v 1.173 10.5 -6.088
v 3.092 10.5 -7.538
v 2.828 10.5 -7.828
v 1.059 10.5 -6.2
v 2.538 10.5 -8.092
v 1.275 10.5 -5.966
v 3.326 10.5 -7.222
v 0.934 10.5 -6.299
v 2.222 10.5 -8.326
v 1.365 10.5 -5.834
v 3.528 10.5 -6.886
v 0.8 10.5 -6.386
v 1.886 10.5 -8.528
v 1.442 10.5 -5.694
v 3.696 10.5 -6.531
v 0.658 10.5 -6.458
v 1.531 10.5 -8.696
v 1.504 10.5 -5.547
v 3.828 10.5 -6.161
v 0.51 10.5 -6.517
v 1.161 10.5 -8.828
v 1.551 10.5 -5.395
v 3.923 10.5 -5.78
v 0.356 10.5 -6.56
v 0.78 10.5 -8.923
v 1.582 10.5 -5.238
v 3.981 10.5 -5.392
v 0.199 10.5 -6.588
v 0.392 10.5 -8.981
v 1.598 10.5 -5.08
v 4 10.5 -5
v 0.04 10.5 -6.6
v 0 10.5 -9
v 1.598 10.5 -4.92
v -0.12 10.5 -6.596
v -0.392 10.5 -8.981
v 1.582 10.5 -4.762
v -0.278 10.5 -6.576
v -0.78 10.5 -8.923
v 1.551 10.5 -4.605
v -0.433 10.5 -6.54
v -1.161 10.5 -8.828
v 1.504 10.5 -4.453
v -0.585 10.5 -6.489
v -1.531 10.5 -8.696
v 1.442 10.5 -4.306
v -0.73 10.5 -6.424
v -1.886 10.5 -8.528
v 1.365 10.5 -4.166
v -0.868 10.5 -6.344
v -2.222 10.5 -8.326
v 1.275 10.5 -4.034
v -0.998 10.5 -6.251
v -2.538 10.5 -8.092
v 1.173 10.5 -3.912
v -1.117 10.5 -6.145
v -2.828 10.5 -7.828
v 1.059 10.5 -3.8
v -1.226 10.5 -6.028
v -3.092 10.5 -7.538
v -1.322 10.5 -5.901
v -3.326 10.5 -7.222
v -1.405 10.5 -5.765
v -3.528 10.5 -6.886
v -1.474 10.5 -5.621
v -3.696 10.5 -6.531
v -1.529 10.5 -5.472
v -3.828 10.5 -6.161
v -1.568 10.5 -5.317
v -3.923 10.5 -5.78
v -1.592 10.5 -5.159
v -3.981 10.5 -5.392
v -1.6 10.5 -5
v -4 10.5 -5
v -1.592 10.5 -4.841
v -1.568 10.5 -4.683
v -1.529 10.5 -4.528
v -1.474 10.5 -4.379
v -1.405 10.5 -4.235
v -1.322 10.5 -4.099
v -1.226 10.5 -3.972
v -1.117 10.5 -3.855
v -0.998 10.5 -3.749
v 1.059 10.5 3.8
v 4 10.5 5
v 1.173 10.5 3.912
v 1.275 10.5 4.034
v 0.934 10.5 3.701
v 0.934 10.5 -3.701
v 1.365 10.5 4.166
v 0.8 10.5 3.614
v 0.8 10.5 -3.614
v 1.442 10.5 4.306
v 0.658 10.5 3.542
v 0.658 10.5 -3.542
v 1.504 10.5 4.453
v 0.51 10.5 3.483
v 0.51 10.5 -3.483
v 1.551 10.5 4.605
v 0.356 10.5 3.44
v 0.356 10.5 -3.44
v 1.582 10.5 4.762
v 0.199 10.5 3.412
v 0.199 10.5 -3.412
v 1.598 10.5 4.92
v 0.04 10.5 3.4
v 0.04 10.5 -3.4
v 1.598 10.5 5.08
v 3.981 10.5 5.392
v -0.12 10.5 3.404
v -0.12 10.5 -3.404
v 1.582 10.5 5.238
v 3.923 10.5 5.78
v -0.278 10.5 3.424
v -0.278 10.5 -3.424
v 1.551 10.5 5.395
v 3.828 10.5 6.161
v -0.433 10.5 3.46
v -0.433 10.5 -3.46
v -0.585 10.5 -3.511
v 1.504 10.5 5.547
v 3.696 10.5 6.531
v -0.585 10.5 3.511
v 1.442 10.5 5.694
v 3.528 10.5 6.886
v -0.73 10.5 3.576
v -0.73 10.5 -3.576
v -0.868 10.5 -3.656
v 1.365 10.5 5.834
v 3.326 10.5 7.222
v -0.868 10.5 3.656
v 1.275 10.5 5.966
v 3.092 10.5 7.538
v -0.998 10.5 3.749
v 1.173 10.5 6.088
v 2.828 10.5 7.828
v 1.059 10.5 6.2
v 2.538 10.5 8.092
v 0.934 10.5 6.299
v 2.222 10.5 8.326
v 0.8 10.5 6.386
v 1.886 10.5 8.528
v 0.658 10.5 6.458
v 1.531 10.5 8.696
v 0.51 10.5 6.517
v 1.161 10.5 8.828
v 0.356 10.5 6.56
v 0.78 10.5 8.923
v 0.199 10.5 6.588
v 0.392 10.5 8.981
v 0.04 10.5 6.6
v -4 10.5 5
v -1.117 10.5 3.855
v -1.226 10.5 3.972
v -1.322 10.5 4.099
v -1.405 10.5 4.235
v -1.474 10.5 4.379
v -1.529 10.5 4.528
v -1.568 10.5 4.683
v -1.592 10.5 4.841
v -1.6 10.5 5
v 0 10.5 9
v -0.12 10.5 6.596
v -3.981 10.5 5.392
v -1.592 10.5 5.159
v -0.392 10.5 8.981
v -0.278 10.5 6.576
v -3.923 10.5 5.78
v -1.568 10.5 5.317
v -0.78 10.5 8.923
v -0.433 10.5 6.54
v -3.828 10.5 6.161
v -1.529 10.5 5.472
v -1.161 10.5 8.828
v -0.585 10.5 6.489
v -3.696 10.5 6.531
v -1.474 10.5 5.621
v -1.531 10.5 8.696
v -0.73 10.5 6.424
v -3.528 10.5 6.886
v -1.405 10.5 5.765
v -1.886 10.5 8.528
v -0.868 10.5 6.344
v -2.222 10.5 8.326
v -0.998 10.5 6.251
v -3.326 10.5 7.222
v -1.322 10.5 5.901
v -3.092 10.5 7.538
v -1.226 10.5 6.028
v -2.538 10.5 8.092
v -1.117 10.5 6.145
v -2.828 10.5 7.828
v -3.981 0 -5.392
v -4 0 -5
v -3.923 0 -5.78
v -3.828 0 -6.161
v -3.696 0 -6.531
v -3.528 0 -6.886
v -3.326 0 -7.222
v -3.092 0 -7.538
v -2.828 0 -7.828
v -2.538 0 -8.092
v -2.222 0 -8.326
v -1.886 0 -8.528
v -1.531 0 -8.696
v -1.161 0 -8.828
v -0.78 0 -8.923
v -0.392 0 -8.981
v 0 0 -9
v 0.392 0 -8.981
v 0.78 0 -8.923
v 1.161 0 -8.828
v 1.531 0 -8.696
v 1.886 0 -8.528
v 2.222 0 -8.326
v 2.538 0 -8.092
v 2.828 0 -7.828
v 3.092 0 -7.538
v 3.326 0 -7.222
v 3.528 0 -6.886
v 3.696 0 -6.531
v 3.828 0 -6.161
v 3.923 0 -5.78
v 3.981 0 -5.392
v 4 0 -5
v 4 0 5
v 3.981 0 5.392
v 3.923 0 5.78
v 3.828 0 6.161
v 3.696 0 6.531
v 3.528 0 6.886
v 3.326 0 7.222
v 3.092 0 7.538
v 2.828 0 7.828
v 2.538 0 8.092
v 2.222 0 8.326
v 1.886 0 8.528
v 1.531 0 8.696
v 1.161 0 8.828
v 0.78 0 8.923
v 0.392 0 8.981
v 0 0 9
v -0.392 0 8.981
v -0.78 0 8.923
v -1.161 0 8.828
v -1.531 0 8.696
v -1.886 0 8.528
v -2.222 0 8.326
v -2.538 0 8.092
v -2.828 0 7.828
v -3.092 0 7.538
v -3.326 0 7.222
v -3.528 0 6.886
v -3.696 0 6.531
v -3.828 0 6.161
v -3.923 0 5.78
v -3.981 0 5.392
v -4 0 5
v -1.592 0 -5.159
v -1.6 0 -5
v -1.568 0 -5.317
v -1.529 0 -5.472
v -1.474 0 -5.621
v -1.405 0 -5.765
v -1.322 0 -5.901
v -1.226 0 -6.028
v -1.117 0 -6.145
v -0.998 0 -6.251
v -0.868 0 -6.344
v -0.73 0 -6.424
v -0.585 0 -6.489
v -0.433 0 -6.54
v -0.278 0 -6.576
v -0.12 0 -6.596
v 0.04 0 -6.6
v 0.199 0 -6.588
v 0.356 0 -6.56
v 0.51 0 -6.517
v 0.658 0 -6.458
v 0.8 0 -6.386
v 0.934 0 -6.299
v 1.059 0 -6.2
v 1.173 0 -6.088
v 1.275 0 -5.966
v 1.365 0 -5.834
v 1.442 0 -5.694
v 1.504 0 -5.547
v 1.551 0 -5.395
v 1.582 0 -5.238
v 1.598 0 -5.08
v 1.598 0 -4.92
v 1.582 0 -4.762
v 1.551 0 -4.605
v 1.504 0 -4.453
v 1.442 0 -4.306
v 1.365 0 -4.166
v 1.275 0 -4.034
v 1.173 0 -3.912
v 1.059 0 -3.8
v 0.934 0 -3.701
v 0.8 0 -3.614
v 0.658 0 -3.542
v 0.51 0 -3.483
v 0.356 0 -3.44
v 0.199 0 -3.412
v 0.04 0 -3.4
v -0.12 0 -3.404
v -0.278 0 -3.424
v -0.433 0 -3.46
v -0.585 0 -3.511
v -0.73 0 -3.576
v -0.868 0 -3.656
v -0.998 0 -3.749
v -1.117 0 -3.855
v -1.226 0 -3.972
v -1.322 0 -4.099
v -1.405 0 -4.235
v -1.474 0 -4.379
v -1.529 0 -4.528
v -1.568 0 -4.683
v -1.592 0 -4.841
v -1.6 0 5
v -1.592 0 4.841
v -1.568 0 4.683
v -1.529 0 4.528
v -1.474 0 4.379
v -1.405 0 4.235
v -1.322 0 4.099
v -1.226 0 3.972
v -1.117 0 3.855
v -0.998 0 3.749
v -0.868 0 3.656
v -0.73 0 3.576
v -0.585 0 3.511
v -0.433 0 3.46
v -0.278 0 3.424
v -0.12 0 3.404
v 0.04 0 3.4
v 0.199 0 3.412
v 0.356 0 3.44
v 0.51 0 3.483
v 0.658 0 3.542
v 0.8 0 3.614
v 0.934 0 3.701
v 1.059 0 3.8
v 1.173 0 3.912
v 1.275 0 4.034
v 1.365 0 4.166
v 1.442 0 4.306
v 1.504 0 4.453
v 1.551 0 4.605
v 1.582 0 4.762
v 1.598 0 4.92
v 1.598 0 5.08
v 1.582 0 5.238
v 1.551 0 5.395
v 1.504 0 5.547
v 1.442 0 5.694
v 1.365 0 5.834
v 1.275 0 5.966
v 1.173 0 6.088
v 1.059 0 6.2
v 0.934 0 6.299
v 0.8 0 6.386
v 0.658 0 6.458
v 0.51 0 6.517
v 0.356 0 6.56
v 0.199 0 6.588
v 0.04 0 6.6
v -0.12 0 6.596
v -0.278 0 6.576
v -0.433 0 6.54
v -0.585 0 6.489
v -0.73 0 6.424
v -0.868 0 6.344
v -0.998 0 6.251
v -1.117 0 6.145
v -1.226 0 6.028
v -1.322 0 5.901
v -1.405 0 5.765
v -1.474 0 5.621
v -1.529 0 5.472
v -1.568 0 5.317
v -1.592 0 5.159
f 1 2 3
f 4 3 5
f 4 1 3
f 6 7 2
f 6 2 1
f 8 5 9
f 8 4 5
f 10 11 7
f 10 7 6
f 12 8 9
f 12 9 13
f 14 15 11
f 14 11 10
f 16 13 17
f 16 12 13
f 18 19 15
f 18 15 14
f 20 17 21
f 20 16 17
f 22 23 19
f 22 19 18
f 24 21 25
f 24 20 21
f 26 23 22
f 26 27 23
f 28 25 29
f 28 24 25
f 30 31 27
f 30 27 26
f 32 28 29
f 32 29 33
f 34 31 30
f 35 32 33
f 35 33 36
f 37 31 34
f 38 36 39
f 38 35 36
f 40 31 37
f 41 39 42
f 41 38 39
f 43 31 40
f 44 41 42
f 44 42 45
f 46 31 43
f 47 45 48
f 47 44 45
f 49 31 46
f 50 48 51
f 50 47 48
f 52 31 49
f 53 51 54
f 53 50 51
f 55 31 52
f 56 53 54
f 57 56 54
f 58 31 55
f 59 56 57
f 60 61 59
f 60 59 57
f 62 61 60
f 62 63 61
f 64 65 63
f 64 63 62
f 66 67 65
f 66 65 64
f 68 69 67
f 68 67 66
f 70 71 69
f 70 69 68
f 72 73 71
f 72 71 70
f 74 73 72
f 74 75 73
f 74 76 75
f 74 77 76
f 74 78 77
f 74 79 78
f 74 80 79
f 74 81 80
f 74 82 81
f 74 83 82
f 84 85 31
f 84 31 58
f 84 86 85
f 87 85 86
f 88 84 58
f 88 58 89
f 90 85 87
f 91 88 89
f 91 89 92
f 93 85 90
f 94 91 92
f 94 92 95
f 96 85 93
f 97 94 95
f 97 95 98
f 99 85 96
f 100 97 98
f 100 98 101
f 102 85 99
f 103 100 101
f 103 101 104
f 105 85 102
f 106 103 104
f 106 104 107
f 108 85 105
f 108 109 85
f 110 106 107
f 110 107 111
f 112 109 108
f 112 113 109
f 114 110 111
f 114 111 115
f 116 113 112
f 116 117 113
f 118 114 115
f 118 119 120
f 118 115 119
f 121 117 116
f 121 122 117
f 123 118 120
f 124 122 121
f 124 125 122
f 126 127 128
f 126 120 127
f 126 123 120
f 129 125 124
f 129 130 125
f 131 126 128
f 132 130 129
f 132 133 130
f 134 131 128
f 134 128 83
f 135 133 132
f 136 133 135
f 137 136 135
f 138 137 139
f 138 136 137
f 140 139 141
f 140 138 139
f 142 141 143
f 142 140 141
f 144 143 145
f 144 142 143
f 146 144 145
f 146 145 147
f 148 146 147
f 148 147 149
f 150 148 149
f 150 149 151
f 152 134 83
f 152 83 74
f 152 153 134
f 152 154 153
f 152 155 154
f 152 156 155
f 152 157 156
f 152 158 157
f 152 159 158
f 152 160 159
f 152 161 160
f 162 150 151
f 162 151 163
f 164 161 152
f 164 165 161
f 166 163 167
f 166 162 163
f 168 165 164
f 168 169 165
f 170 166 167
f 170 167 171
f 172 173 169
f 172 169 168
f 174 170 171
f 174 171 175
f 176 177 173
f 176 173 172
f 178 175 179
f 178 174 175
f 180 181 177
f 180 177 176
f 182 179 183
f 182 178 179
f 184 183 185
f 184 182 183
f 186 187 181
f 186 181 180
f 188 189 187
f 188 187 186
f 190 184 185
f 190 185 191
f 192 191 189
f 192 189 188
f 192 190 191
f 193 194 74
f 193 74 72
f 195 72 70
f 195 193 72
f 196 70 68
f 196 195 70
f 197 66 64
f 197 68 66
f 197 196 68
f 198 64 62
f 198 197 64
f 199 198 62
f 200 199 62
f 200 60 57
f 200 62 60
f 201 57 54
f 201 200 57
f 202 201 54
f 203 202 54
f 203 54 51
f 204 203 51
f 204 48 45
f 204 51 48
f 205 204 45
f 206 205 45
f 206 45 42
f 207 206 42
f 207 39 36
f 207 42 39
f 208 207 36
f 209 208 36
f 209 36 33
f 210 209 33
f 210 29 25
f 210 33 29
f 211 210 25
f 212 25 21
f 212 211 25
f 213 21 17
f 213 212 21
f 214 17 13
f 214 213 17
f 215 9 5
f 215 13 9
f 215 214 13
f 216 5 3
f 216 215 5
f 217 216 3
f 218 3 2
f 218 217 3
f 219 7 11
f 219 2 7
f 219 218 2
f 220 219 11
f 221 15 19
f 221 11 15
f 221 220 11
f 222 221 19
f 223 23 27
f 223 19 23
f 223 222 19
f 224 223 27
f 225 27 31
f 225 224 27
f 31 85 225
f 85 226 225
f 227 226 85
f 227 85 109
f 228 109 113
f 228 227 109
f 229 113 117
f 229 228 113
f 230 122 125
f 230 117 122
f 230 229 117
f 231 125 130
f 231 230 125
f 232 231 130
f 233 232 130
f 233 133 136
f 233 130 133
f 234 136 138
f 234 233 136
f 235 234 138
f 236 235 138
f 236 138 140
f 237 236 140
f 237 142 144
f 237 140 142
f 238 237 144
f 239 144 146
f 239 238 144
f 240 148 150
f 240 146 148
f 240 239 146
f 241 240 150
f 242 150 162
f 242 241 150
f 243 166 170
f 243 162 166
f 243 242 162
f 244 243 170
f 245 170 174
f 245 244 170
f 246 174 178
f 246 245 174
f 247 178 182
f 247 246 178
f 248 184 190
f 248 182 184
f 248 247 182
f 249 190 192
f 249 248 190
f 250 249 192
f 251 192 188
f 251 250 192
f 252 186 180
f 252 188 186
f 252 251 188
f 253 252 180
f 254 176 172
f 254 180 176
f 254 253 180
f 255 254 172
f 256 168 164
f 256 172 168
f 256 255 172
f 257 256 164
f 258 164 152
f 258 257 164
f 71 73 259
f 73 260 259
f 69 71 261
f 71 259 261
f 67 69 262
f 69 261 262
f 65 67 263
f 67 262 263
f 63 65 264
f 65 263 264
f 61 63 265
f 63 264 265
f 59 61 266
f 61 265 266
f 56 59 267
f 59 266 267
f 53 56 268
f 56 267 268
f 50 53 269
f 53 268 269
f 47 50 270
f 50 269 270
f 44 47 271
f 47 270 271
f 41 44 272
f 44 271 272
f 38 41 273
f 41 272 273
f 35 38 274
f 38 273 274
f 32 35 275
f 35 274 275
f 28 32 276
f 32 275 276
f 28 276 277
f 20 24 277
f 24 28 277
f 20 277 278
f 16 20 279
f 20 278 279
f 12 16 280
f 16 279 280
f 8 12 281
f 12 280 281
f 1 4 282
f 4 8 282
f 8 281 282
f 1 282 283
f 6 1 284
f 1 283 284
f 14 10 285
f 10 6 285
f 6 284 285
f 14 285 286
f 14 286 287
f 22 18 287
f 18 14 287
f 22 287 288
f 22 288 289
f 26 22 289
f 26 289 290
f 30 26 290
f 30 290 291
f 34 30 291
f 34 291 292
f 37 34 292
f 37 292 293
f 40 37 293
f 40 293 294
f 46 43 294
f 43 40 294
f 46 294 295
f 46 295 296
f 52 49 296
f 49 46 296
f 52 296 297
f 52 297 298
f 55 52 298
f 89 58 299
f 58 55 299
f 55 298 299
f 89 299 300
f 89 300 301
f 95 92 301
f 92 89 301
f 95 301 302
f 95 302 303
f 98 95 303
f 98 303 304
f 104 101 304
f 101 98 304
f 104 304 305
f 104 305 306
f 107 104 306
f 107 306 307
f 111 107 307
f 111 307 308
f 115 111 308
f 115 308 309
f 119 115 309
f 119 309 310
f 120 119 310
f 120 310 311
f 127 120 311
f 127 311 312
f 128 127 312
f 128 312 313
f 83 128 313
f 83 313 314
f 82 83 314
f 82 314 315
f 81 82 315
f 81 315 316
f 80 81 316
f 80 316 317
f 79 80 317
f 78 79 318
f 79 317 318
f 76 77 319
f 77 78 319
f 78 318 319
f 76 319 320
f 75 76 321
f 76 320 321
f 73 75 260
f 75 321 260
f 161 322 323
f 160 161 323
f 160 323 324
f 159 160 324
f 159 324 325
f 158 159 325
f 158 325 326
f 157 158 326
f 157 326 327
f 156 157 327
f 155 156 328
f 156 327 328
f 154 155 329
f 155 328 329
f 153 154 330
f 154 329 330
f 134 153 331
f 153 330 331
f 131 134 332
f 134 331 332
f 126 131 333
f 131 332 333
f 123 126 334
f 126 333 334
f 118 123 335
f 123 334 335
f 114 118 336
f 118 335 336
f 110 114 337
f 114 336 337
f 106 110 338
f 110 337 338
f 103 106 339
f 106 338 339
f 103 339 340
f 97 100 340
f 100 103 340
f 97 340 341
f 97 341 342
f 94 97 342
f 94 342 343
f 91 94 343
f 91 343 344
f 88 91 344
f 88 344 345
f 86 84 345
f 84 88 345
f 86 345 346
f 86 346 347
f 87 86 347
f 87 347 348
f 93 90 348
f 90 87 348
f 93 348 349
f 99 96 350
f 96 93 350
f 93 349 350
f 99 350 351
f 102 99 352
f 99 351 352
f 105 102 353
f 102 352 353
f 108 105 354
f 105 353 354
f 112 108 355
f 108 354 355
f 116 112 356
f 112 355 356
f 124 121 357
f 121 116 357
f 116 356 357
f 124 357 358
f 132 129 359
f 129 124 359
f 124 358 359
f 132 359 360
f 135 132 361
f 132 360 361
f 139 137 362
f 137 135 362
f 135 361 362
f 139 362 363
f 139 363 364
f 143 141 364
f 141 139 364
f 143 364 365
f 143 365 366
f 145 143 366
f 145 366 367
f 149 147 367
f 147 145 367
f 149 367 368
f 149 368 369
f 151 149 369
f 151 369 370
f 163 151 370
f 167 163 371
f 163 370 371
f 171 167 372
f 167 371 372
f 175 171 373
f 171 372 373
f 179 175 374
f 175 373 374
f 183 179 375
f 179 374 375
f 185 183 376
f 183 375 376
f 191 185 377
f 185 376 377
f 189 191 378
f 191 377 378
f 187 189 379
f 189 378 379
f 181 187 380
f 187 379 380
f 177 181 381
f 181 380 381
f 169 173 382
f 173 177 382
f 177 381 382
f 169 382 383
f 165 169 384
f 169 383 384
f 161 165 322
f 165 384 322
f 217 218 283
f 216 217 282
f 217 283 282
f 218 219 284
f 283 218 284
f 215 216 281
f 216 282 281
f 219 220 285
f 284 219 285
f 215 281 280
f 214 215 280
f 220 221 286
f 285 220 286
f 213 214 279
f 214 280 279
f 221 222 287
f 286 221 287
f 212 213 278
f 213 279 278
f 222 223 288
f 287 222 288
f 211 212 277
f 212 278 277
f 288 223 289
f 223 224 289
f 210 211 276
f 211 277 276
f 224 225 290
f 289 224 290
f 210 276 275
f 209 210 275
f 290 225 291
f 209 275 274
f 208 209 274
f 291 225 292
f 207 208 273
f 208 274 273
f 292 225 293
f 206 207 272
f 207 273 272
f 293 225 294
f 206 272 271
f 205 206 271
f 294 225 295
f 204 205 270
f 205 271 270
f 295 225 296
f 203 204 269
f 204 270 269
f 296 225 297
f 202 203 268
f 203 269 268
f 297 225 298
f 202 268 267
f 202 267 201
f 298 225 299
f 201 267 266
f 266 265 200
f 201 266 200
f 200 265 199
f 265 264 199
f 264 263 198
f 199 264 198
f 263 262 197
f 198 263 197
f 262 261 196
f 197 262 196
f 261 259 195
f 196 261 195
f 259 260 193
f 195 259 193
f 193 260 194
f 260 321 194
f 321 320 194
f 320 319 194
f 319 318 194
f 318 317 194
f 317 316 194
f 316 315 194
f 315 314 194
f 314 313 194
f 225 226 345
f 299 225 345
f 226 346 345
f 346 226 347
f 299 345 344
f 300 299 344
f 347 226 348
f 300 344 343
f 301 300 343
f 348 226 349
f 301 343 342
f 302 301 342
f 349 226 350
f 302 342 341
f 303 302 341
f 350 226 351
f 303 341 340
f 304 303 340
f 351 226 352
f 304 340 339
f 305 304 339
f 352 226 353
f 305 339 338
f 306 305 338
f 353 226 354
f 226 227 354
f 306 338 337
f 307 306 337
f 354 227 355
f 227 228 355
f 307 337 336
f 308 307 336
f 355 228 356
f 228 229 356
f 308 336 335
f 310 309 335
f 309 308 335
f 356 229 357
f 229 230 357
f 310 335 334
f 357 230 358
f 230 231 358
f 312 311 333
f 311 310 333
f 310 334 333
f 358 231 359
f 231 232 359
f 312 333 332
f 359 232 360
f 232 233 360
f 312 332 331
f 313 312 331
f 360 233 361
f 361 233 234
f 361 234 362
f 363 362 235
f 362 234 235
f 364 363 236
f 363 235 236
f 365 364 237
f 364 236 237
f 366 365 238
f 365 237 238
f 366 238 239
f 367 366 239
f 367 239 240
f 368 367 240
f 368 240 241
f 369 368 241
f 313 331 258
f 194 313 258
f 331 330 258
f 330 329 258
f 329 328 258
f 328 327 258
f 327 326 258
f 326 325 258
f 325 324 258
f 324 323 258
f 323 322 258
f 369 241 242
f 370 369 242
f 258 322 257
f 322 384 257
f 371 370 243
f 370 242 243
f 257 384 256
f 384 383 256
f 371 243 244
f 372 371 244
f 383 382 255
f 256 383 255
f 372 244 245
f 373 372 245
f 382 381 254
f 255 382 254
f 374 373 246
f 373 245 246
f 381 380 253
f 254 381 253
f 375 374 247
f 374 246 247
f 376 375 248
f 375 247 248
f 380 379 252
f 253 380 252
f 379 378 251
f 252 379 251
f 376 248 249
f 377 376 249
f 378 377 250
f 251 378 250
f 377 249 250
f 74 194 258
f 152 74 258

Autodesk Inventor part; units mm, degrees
ref_plane "YZ Plane" through (0, 0, 0) normal (1, 0, 0) x (0, 1, 0)
ref_plane "XZ Plane" through (0, 0, 0) normal (0, 1, 0) x (-1, 0, 0)
ref_plane "XY Plane" through (0, 0, 0) normal (0, 0, 1) x (1, 0, 0)
sketch "スケッチ1" plane through (0, 0, 0) normal (0, 1, 0) x (-1, 0, 0)
  circle A0 centre (0, 5) radius 1.6
  circle A1 centre (0, -5) radius 1.6
  line L0 (5.6, 0) -> (-5.6, 0) projected
  line L1 (0, -5) -> (0, 5) construction
  line L2 (4, -5) -> (4, 5)
  line L3 (-4, 5) -> (-4, -5)
  arc A2 (-4, -5) -> (4, -5) centre (0, -5) ccw
  arc A3 (4, 5) -> (-4, 5) centre (0, 5) ccw
  point P0 (0, 0)
  dimension "d0" = 3.2
  dimension "d1" = 3.2
  dimension "d2" = 10
  dimension "d3" = 4
extrude "押し出し1" add sketch "スケッチ1" along normal blind 10.5
properties part number "spacer_2_hole"
